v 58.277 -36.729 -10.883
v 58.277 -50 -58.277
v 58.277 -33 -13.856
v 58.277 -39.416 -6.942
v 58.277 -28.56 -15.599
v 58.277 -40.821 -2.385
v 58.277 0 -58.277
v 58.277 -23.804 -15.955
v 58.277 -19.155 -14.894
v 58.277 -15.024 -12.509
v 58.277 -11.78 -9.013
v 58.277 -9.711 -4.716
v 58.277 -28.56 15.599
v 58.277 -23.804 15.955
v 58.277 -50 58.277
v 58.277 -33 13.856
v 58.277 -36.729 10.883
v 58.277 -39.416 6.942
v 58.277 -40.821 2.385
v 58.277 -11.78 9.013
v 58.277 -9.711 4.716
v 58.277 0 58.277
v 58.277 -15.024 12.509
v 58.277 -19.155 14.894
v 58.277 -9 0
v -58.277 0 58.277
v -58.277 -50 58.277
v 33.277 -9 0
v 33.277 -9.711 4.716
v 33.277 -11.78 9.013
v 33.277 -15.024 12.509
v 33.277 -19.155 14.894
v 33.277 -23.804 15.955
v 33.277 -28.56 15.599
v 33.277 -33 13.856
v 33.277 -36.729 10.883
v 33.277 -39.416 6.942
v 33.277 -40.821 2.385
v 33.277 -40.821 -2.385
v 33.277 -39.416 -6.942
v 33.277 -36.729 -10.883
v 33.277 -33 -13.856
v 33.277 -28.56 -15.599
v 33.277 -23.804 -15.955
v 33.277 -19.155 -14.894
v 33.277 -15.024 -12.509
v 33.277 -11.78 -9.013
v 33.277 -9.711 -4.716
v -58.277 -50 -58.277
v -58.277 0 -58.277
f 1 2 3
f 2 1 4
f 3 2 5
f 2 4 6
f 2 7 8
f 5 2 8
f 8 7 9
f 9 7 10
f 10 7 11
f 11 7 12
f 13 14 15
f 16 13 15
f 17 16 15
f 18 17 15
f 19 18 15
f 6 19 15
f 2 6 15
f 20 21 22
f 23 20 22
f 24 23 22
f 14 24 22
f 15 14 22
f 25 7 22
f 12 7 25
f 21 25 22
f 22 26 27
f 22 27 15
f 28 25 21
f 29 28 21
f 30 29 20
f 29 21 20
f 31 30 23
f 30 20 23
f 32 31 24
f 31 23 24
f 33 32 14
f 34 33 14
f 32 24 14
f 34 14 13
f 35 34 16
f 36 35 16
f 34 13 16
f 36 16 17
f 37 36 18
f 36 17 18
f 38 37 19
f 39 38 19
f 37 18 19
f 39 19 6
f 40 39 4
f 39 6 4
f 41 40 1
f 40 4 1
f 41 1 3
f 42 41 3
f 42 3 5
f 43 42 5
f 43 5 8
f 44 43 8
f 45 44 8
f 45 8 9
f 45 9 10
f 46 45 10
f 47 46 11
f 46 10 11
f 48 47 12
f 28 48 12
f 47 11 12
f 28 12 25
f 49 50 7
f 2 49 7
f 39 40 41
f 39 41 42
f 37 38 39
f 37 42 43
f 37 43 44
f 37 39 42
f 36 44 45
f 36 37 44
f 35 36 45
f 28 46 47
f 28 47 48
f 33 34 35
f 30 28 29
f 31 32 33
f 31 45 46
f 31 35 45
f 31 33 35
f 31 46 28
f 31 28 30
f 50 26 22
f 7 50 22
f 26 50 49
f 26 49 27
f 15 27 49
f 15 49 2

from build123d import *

# Parameters (mm, degrees)
F0_W     = 116.554148
F0_H     = 116.554148
F1_DEPTH = 50
F2_R     = 16
F3_DEPTH = 25


with BuildPart() as f1:
    # F0 (on Front) → F1 (new body)
    with BuildSketch(Plane.XZ):
        Rectangle(F0_W, F0_H)
    extrude(amount=F1_DEPTH)

    # F2 (on face) → F3 (cut)
    with BuildSketch(Plane.YZ.offset(58.277074)):
        with Locations((-25, 0)):
            Circle(F2_R)
    extrude(amount=-F3_DEPTH, mode=Mode.SUBTRACT)


solid = f1.part
